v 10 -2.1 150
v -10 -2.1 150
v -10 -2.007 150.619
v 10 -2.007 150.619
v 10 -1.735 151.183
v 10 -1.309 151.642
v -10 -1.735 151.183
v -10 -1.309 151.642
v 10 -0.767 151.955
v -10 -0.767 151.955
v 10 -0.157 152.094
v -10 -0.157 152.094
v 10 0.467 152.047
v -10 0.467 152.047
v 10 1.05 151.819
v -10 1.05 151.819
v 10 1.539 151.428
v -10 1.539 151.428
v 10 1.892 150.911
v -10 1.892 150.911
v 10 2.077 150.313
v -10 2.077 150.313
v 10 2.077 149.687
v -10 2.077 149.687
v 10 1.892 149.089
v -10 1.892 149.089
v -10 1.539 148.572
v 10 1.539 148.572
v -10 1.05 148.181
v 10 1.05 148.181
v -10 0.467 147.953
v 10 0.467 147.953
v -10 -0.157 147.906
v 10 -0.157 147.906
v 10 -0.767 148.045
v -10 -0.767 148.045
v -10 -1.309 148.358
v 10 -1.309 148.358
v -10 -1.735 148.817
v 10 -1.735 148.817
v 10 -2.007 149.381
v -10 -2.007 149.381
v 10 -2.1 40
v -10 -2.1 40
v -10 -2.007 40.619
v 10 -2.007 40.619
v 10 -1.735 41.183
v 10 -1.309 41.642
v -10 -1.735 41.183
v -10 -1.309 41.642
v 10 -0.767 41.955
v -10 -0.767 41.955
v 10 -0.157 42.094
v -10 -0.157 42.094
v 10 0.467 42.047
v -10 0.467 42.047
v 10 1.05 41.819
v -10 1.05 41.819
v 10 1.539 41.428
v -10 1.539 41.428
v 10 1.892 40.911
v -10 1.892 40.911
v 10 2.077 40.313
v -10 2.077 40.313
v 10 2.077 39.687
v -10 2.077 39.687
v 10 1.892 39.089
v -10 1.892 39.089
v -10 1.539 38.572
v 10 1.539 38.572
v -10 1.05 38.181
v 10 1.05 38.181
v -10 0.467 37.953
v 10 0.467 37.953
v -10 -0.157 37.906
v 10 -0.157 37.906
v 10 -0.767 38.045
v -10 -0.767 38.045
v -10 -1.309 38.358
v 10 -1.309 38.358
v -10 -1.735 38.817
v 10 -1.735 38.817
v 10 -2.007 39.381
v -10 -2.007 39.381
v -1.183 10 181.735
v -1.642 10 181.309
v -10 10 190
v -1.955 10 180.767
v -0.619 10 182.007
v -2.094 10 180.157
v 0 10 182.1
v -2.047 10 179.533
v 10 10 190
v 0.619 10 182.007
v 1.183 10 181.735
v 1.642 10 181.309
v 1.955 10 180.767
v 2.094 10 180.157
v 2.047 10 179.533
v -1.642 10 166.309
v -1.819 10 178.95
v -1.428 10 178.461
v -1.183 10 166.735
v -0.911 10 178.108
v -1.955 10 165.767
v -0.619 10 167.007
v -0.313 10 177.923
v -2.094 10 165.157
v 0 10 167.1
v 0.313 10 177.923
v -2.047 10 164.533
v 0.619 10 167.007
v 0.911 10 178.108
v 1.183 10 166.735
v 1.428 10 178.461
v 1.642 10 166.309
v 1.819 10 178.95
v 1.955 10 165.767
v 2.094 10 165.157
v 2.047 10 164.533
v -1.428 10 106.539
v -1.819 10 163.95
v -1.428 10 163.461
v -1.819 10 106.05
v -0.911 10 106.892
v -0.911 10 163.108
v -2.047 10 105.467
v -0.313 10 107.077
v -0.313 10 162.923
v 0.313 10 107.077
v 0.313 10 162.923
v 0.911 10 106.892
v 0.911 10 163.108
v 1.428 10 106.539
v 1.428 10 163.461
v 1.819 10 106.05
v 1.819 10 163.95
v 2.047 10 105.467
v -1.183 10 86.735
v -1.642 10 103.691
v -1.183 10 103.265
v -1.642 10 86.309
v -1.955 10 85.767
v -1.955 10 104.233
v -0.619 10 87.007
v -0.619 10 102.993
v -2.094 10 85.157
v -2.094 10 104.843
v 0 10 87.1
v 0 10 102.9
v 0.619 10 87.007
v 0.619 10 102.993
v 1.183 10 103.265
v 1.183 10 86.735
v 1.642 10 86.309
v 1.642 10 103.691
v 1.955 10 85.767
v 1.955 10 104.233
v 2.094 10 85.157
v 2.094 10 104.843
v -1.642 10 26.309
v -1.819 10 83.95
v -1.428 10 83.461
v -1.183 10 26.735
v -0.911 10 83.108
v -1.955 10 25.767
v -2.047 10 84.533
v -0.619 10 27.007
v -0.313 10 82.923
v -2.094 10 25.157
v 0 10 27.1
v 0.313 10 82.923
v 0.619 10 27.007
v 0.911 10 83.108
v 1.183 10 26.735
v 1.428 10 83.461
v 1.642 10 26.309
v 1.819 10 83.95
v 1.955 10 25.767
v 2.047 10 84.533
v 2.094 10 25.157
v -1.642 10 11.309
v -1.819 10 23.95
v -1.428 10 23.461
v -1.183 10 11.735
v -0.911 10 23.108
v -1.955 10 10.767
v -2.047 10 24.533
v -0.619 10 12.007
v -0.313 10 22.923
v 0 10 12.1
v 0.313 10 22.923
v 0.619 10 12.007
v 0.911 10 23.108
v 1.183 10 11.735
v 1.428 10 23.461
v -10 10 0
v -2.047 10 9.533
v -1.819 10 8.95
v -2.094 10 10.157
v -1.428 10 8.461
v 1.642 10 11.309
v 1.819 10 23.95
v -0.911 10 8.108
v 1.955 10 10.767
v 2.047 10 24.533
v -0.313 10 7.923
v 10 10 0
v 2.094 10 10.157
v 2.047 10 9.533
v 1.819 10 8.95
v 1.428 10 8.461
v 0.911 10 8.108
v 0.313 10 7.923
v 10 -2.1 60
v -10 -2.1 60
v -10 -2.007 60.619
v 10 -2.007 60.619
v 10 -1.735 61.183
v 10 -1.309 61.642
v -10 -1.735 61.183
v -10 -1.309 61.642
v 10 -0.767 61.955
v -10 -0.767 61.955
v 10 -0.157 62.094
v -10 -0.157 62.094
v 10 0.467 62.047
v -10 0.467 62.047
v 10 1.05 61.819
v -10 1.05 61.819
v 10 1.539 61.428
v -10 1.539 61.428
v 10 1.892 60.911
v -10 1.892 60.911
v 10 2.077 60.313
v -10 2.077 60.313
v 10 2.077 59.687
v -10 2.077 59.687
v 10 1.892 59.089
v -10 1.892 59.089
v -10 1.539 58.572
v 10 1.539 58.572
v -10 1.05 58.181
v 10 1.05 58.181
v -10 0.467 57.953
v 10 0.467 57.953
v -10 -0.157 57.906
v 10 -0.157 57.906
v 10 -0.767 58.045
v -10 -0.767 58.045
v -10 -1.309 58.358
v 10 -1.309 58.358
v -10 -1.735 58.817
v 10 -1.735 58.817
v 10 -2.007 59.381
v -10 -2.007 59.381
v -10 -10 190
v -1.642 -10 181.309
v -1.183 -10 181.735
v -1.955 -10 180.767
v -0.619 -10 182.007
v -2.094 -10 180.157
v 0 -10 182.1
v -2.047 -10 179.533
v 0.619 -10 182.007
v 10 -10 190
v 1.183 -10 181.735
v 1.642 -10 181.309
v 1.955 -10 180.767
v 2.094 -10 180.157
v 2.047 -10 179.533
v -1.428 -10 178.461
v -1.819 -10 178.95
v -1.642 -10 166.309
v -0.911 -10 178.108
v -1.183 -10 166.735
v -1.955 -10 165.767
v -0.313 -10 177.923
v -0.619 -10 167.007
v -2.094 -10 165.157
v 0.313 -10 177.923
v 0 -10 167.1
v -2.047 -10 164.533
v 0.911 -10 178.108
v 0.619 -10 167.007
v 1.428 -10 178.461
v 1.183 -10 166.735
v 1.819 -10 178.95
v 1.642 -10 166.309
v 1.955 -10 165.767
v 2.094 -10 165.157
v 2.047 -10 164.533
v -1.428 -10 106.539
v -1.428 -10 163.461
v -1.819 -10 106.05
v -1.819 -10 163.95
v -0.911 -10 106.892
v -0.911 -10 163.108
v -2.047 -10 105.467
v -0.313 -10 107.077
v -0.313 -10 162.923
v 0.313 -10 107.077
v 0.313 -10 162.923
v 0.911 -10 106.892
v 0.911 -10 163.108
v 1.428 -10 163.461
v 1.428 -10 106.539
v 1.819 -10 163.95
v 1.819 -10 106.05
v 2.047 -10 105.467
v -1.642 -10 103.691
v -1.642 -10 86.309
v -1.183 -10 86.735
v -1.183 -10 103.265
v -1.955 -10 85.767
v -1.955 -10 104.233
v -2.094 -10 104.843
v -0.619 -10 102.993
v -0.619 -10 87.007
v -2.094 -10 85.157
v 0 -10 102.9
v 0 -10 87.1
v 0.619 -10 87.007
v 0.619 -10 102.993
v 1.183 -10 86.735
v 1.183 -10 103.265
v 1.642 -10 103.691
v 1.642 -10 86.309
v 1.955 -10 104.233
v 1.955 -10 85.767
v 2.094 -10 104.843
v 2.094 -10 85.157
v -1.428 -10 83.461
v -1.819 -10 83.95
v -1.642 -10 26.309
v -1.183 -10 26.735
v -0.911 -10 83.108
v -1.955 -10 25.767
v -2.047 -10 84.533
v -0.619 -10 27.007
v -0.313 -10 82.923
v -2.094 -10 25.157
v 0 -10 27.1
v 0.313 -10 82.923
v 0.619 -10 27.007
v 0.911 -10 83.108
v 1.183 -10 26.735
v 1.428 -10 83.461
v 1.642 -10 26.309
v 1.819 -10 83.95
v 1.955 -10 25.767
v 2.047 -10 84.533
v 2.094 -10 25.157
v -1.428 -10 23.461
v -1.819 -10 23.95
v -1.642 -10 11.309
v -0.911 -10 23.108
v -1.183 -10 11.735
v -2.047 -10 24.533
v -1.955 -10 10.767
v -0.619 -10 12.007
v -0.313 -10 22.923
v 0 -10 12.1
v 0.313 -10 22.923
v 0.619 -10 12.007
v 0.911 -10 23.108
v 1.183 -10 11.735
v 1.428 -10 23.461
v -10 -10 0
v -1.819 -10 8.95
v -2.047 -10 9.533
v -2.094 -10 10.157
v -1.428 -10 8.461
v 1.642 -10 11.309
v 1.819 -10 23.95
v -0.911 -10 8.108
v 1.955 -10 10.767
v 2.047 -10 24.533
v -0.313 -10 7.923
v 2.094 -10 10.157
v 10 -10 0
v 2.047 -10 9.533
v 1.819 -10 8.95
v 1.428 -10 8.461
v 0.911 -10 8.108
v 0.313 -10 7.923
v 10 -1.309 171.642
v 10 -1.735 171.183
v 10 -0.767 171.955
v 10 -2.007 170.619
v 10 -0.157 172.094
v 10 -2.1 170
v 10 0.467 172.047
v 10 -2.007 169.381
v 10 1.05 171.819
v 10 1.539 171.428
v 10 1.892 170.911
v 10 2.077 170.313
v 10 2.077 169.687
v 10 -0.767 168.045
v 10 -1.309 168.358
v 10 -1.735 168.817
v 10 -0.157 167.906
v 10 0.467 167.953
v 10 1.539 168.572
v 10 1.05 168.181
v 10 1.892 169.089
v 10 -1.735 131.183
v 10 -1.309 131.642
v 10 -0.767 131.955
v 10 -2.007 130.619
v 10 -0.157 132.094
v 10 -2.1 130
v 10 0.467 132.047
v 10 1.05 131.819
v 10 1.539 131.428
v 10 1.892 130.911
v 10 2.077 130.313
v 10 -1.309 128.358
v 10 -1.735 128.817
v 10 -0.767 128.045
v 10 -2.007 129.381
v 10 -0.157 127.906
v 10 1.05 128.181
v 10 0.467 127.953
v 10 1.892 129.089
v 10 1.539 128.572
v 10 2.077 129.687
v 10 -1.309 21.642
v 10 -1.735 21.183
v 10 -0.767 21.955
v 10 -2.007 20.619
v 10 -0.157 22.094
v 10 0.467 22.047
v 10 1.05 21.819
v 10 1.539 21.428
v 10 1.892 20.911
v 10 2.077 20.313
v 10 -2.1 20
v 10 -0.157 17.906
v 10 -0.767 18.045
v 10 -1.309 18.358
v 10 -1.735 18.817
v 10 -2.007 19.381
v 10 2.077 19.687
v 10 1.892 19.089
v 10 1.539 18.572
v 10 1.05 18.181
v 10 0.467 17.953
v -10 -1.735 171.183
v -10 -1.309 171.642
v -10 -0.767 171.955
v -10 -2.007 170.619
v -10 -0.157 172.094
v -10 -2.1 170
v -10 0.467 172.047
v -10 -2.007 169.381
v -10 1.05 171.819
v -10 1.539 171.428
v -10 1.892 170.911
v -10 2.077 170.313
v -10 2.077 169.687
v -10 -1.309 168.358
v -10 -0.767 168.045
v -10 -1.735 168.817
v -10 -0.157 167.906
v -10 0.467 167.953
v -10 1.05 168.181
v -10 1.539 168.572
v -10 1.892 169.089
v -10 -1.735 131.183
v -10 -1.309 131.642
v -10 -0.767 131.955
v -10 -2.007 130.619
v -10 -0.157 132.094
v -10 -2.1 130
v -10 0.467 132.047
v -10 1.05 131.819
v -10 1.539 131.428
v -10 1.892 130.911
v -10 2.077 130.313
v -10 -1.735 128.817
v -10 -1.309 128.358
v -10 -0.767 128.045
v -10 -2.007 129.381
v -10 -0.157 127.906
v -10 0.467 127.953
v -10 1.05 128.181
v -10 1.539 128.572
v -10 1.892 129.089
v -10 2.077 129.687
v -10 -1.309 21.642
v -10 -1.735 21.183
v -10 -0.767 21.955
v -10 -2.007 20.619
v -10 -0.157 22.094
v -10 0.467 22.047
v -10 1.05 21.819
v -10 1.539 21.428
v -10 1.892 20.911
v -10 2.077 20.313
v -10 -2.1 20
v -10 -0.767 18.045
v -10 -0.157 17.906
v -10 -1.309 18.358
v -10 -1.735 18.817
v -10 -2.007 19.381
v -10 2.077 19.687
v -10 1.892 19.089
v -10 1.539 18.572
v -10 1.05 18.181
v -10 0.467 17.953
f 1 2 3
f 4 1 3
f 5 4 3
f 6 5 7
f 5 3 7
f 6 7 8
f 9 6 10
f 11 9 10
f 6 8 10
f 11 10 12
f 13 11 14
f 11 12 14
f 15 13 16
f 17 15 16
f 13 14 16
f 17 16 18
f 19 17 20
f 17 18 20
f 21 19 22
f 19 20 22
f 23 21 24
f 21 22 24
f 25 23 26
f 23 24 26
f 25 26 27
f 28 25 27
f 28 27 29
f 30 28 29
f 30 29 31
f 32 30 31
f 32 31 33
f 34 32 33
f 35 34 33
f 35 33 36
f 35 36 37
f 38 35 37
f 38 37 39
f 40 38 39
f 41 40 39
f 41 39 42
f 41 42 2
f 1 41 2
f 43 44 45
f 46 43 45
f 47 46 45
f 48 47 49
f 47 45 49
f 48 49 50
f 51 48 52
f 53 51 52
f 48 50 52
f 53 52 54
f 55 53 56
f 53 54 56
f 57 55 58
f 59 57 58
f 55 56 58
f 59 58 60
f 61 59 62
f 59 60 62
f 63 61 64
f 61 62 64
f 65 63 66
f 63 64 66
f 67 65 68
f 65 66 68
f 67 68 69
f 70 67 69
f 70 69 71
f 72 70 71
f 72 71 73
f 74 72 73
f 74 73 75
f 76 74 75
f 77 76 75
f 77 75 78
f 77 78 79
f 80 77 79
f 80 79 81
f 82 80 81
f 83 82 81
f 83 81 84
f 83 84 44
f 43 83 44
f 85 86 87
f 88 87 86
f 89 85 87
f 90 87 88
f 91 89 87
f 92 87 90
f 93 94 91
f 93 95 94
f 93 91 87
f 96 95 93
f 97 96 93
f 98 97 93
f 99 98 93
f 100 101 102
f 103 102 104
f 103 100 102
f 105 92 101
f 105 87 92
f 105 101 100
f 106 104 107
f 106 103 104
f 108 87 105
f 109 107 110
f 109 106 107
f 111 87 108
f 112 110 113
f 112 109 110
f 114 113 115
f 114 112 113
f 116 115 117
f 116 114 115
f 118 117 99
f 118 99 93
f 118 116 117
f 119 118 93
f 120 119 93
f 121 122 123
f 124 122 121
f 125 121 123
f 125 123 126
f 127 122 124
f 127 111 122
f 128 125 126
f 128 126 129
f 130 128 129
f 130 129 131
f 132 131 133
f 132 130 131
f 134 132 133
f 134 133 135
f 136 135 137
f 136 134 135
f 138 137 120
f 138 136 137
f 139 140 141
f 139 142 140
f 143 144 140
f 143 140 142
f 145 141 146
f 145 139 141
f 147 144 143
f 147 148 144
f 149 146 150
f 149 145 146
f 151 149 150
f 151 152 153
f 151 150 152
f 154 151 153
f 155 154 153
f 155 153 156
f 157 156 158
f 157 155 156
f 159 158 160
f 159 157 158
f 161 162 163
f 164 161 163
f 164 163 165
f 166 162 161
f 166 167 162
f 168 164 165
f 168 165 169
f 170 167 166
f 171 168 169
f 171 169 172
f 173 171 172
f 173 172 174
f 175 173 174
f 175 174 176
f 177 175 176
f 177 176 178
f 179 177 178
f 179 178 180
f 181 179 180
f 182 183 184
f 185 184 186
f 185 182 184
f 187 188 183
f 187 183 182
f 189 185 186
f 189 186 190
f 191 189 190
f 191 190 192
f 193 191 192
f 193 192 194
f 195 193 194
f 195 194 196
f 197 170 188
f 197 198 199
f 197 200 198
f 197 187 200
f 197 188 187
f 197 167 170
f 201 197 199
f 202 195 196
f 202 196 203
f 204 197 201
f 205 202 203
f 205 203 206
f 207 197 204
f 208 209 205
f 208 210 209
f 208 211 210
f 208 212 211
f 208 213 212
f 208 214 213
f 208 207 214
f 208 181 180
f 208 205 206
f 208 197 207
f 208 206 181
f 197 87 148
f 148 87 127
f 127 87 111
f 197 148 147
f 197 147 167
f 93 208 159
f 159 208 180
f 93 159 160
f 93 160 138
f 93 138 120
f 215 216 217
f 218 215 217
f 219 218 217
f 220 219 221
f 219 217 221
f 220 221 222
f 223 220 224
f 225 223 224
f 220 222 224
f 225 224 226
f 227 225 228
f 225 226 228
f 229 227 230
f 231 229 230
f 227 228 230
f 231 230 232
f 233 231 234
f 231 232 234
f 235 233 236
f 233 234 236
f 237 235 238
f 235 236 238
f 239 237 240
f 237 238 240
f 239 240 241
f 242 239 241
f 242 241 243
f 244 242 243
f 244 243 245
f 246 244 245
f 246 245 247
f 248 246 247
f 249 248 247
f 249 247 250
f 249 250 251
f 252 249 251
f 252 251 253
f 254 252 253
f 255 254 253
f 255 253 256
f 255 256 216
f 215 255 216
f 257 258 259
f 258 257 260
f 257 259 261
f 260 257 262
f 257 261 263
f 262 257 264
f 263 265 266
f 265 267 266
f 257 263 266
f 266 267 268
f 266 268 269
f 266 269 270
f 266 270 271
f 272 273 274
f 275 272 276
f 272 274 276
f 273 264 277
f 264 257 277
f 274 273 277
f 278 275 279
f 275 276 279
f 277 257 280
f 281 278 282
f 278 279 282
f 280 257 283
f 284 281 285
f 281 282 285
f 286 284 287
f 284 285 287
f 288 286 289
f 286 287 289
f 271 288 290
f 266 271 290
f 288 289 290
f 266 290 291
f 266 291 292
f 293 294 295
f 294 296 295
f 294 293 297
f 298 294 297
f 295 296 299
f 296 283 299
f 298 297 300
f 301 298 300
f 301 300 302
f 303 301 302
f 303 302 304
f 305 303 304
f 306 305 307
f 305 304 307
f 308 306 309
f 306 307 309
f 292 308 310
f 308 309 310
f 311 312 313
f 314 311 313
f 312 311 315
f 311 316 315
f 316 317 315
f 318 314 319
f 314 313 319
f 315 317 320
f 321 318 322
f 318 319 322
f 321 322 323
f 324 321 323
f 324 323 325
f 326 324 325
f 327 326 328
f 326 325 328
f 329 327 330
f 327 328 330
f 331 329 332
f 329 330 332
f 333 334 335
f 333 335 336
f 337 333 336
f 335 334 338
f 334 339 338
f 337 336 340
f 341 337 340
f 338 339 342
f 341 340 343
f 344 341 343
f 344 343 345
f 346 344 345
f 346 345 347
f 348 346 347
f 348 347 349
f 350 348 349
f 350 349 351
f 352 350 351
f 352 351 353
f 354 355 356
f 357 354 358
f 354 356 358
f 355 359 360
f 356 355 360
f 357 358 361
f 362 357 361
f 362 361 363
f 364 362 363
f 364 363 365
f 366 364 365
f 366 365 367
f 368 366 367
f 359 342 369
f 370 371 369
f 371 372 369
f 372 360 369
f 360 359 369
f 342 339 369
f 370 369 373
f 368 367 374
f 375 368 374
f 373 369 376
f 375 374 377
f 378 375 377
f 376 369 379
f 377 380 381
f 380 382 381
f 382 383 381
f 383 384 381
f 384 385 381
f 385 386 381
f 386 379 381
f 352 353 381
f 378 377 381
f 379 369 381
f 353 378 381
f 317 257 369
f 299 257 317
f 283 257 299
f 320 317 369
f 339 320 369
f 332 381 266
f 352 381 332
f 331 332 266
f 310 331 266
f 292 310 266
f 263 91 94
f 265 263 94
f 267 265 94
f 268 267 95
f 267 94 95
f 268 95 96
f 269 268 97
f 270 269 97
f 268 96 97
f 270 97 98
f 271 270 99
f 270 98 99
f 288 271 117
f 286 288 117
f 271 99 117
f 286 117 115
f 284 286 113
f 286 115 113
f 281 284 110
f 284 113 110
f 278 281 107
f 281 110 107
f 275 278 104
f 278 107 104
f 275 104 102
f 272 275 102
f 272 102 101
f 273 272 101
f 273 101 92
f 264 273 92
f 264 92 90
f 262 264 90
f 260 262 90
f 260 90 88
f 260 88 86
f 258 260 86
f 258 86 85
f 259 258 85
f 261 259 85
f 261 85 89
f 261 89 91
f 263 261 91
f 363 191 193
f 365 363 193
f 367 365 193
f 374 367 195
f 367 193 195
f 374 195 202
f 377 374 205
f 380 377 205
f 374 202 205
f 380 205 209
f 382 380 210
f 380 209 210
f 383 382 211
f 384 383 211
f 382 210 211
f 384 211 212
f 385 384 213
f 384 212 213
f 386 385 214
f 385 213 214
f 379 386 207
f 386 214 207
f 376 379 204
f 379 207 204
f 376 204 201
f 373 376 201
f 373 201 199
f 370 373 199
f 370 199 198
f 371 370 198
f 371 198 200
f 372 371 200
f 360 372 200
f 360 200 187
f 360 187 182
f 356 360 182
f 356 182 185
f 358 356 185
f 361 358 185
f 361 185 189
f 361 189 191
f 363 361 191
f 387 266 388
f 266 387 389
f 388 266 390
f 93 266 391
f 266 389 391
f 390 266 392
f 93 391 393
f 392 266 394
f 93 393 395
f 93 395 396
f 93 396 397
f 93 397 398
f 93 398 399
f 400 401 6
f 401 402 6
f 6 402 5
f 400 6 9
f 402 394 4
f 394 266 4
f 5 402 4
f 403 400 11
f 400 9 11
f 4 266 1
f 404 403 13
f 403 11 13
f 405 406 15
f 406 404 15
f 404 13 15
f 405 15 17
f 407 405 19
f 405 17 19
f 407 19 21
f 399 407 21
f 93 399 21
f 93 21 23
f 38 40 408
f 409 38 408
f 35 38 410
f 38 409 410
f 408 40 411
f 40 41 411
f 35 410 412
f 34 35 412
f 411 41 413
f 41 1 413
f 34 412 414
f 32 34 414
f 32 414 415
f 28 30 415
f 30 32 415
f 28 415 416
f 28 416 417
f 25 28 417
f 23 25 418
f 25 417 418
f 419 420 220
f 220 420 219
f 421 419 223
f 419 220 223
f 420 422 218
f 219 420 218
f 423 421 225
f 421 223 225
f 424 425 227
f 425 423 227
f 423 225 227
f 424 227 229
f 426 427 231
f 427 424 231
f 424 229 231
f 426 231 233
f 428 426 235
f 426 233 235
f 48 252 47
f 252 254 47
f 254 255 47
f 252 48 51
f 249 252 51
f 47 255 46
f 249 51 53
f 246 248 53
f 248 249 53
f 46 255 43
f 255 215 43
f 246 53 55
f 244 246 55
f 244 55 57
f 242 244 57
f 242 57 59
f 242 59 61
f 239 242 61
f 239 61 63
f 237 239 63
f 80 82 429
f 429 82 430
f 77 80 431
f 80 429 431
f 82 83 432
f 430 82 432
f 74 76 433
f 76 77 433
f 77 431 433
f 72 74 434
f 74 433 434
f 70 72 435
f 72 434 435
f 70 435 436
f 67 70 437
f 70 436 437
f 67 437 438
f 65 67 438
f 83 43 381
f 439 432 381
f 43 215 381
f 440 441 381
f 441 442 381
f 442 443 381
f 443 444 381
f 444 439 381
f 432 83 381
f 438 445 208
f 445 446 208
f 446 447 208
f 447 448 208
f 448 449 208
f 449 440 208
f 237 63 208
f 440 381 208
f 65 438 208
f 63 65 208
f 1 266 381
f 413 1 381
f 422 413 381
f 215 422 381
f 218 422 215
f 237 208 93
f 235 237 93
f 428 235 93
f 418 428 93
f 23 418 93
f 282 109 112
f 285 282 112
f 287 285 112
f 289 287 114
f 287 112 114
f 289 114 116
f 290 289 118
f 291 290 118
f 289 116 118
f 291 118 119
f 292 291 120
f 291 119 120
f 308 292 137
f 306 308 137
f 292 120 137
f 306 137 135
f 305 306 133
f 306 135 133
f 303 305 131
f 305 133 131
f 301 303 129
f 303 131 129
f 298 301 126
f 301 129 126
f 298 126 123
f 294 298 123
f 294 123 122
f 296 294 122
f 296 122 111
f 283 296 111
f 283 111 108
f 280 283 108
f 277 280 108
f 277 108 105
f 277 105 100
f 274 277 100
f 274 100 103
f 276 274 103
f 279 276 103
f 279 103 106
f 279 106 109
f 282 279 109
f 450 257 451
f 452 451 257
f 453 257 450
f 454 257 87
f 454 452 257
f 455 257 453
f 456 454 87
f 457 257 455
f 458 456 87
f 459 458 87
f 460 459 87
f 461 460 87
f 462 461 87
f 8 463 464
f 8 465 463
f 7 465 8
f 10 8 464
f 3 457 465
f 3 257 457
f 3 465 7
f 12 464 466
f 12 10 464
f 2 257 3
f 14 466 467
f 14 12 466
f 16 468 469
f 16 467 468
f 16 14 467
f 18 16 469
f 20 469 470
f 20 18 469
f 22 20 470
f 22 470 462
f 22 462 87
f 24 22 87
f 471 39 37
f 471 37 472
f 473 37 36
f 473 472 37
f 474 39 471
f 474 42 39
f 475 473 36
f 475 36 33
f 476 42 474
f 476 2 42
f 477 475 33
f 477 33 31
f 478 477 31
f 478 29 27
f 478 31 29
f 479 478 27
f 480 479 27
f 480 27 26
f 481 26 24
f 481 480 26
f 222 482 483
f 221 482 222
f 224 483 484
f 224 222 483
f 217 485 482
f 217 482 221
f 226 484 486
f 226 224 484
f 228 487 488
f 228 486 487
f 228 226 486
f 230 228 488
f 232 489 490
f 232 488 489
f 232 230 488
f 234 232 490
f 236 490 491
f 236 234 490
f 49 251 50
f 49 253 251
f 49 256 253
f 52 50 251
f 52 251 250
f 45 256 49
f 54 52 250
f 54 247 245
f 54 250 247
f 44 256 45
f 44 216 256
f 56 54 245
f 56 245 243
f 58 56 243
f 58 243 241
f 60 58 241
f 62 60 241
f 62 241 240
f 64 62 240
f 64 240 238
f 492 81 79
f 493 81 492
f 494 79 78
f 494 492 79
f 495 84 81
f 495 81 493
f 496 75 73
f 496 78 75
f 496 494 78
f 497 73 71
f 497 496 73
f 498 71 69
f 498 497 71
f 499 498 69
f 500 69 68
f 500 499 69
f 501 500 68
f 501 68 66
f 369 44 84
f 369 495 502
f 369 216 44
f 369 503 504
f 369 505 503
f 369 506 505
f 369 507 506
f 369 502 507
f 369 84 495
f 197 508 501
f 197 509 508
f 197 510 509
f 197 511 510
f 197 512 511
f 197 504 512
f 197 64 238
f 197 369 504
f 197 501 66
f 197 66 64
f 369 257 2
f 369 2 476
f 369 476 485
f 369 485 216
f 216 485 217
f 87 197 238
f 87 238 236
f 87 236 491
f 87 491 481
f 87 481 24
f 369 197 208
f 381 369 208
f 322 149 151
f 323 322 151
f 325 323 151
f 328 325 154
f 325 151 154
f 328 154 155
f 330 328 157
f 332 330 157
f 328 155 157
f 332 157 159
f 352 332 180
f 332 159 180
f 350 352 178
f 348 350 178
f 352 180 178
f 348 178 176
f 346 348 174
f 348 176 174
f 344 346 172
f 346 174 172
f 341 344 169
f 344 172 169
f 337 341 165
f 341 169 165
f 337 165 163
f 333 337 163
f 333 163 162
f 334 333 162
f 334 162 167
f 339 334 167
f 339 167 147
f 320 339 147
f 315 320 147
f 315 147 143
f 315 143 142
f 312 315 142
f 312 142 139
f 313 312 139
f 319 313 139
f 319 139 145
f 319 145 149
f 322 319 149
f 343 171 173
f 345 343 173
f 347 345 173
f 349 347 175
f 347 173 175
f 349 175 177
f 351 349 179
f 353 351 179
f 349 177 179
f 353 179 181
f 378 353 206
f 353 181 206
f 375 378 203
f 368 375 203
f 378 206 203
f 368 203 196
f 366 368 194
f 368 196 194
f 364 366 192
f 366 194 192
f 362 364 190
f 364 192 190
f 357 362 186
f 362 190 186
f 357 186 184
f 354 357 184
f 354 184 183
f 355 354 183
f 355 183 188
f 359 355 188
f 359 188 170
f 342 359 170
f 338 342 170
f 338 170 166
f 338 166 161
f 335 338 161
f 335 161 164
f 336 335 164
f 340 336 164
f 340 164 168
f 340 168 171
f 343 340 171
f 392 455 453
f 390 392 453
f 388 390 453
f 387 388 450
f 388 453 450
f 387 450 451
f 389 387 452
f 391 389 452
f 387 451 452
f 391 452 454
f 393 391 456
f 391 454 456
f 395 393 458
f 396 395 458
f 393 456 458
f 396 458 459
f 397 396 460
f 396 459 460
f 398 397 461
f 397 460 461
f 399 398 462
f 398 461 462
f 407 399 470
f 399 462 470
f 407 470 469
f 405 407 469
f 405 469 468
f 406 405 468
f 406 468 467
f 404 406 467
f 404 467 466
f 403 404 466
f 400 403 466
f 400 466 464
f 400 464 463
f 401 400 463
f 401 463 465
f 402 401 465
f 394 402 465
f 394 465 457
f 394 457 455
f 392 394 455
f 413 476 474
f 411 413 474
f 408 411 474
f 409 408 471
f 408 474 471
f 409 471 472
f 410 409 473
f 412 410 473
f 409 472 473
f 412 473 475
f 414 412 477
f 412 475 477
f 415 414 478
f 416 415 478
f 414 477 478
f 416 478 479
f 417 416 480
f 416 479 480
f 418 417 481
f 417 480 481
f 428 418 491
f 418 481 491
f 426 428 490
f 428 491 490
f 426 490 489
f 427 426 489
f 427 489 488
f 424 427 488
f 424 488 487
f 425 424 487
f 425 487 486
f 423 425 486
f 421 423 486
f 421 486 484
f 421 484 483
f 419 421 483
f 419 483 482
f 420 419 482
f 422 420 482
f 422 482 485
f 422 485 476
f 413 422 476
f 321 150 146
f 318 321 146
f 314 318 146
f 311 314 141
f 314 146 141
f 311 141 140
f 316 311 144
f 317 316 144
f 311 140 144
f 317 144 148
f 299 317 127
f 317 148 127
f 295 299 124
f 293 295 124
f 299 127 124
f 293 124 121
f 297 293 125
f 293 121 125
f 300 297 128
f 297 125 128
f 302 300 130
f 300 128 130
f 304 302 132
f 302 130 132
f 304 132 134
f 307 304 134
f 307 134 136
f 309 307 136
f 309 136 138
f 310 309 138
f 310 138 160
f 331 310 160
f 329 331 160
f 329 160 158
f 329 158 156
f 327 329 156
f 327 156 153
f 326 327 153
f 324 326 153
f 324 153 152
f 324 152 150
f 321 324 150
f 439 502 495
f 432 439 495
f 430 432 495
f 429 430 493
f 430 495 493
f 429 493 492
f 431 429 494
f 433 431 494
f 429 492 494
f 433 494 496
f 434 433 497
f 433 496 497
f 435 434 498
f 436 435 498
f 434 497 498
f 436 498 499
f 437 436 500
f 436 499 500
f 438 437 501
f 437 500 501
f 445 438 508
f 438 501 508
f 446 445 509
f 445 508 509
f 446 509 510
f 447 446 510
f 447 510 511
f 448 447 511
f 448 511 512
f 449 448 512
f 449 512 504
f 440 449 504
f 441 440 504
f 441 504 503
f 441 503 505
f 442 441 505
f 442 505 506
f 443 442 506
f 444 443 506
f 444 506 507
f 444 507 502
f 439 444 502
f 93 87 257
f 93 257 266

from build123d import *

# Parameters (mm, degrees)
SKETCH_1_W          = 20
SKETCH_1_H          = 20
EXTRUDE_1_DEPTH     = 190
SKETCH_2_R          = 2.1
CUT_EXTRUDE_1_DEPTH = 67
SKETCH_3_R          = 2.1
CUT_EXTRUDE_2_DEPTH = 32
SKETCH_4_R          = 2.1
CUT_EXTRUDE_3_DEPTH = 192.311264697


with BuildPart() as part:
    # 草图1 → 凸台-拉伸1 (new body)
    with BuildSketch(Plane.XY):
        Rectangle(SKETCH_1_W, SKETCH_1_H)
    extrude(amount=EXTRUDE_1_DEPTH)

    # 草图2 → 切除-拉伸1 (cut)
    with BuildSketch(Plane.ZY.offset(10)):
        with Locations(Location((40, 0, 0), (0, 0, 270))):
            Circle(SKETCH_2_R)
        with Locations(Location((20, 0, 0), (0, 0, 270))):
            Circle(SKETCH_2_R)
        with Locations(Location((60, 0, 0), (0, 0, 270))):
            Circle(SKETCH_2_R)
        with Locations(Location((130, 0, 0), (0, 0, 270))):
            Circle(SKETCH_2_R)
        with Locations(Location((170, 0, 0), (0, 0, 270))):
            Circle(SKETCH_2_R)
        with Locations(Location((150, 0, 0), (0, 0, 270))):
            Circle(SKETCH_2_R)
    extrude(amount=-CUT_EXTRUDE_1_DEPTH, mode=Mode.SUBTRACT)

    # 草图3 → 切除-拉伸2 (cut)
    with BuildSketch(Plane(origin=(0, 10, 0), x_dir=(1, 0, 0), z_dir=(0, 1, 0))):
        with Locations(Location((0, -180, 0), (0, 0, 270))):
            Circle(SKETCH_3_R)
        with Locations(Location((0, -165, 0), (0, 0, 270))):
            Circle(SKETCH_3_R)
        with Locations(Location((0, -25, 0), (0, 0, 270))):
            Circle(SKETCH_3_R)
        with Locations(Location((0, -10, 0), (0, 0, 270))):
            Circle(SKETCH_3_R)
    extrude(amount=-CUT_EXTRUDE_2_DEPTH, mode=Mode.SUBTRACT)

    # 草图4 → 切除-拉伸3 (cut, through all)
    with BuildSketch(Plane(origin=(0, 10, 0), x_dir=(1, 0, 0), z_dir=(0, 1, 0))):
        with Locations(Location((0, -85, 0), (0, 0, 270))):
            Circle(SKETCH_4_R)
        with Locations(Location((0, -105, 0), (0, 0, 90))):
            Circle(SKETCH_4_R)
    extrude(amount=-CUT_EXTRUDE_3_DEPTH, mode=Mode.SUBTRACT)


solid = part.part
